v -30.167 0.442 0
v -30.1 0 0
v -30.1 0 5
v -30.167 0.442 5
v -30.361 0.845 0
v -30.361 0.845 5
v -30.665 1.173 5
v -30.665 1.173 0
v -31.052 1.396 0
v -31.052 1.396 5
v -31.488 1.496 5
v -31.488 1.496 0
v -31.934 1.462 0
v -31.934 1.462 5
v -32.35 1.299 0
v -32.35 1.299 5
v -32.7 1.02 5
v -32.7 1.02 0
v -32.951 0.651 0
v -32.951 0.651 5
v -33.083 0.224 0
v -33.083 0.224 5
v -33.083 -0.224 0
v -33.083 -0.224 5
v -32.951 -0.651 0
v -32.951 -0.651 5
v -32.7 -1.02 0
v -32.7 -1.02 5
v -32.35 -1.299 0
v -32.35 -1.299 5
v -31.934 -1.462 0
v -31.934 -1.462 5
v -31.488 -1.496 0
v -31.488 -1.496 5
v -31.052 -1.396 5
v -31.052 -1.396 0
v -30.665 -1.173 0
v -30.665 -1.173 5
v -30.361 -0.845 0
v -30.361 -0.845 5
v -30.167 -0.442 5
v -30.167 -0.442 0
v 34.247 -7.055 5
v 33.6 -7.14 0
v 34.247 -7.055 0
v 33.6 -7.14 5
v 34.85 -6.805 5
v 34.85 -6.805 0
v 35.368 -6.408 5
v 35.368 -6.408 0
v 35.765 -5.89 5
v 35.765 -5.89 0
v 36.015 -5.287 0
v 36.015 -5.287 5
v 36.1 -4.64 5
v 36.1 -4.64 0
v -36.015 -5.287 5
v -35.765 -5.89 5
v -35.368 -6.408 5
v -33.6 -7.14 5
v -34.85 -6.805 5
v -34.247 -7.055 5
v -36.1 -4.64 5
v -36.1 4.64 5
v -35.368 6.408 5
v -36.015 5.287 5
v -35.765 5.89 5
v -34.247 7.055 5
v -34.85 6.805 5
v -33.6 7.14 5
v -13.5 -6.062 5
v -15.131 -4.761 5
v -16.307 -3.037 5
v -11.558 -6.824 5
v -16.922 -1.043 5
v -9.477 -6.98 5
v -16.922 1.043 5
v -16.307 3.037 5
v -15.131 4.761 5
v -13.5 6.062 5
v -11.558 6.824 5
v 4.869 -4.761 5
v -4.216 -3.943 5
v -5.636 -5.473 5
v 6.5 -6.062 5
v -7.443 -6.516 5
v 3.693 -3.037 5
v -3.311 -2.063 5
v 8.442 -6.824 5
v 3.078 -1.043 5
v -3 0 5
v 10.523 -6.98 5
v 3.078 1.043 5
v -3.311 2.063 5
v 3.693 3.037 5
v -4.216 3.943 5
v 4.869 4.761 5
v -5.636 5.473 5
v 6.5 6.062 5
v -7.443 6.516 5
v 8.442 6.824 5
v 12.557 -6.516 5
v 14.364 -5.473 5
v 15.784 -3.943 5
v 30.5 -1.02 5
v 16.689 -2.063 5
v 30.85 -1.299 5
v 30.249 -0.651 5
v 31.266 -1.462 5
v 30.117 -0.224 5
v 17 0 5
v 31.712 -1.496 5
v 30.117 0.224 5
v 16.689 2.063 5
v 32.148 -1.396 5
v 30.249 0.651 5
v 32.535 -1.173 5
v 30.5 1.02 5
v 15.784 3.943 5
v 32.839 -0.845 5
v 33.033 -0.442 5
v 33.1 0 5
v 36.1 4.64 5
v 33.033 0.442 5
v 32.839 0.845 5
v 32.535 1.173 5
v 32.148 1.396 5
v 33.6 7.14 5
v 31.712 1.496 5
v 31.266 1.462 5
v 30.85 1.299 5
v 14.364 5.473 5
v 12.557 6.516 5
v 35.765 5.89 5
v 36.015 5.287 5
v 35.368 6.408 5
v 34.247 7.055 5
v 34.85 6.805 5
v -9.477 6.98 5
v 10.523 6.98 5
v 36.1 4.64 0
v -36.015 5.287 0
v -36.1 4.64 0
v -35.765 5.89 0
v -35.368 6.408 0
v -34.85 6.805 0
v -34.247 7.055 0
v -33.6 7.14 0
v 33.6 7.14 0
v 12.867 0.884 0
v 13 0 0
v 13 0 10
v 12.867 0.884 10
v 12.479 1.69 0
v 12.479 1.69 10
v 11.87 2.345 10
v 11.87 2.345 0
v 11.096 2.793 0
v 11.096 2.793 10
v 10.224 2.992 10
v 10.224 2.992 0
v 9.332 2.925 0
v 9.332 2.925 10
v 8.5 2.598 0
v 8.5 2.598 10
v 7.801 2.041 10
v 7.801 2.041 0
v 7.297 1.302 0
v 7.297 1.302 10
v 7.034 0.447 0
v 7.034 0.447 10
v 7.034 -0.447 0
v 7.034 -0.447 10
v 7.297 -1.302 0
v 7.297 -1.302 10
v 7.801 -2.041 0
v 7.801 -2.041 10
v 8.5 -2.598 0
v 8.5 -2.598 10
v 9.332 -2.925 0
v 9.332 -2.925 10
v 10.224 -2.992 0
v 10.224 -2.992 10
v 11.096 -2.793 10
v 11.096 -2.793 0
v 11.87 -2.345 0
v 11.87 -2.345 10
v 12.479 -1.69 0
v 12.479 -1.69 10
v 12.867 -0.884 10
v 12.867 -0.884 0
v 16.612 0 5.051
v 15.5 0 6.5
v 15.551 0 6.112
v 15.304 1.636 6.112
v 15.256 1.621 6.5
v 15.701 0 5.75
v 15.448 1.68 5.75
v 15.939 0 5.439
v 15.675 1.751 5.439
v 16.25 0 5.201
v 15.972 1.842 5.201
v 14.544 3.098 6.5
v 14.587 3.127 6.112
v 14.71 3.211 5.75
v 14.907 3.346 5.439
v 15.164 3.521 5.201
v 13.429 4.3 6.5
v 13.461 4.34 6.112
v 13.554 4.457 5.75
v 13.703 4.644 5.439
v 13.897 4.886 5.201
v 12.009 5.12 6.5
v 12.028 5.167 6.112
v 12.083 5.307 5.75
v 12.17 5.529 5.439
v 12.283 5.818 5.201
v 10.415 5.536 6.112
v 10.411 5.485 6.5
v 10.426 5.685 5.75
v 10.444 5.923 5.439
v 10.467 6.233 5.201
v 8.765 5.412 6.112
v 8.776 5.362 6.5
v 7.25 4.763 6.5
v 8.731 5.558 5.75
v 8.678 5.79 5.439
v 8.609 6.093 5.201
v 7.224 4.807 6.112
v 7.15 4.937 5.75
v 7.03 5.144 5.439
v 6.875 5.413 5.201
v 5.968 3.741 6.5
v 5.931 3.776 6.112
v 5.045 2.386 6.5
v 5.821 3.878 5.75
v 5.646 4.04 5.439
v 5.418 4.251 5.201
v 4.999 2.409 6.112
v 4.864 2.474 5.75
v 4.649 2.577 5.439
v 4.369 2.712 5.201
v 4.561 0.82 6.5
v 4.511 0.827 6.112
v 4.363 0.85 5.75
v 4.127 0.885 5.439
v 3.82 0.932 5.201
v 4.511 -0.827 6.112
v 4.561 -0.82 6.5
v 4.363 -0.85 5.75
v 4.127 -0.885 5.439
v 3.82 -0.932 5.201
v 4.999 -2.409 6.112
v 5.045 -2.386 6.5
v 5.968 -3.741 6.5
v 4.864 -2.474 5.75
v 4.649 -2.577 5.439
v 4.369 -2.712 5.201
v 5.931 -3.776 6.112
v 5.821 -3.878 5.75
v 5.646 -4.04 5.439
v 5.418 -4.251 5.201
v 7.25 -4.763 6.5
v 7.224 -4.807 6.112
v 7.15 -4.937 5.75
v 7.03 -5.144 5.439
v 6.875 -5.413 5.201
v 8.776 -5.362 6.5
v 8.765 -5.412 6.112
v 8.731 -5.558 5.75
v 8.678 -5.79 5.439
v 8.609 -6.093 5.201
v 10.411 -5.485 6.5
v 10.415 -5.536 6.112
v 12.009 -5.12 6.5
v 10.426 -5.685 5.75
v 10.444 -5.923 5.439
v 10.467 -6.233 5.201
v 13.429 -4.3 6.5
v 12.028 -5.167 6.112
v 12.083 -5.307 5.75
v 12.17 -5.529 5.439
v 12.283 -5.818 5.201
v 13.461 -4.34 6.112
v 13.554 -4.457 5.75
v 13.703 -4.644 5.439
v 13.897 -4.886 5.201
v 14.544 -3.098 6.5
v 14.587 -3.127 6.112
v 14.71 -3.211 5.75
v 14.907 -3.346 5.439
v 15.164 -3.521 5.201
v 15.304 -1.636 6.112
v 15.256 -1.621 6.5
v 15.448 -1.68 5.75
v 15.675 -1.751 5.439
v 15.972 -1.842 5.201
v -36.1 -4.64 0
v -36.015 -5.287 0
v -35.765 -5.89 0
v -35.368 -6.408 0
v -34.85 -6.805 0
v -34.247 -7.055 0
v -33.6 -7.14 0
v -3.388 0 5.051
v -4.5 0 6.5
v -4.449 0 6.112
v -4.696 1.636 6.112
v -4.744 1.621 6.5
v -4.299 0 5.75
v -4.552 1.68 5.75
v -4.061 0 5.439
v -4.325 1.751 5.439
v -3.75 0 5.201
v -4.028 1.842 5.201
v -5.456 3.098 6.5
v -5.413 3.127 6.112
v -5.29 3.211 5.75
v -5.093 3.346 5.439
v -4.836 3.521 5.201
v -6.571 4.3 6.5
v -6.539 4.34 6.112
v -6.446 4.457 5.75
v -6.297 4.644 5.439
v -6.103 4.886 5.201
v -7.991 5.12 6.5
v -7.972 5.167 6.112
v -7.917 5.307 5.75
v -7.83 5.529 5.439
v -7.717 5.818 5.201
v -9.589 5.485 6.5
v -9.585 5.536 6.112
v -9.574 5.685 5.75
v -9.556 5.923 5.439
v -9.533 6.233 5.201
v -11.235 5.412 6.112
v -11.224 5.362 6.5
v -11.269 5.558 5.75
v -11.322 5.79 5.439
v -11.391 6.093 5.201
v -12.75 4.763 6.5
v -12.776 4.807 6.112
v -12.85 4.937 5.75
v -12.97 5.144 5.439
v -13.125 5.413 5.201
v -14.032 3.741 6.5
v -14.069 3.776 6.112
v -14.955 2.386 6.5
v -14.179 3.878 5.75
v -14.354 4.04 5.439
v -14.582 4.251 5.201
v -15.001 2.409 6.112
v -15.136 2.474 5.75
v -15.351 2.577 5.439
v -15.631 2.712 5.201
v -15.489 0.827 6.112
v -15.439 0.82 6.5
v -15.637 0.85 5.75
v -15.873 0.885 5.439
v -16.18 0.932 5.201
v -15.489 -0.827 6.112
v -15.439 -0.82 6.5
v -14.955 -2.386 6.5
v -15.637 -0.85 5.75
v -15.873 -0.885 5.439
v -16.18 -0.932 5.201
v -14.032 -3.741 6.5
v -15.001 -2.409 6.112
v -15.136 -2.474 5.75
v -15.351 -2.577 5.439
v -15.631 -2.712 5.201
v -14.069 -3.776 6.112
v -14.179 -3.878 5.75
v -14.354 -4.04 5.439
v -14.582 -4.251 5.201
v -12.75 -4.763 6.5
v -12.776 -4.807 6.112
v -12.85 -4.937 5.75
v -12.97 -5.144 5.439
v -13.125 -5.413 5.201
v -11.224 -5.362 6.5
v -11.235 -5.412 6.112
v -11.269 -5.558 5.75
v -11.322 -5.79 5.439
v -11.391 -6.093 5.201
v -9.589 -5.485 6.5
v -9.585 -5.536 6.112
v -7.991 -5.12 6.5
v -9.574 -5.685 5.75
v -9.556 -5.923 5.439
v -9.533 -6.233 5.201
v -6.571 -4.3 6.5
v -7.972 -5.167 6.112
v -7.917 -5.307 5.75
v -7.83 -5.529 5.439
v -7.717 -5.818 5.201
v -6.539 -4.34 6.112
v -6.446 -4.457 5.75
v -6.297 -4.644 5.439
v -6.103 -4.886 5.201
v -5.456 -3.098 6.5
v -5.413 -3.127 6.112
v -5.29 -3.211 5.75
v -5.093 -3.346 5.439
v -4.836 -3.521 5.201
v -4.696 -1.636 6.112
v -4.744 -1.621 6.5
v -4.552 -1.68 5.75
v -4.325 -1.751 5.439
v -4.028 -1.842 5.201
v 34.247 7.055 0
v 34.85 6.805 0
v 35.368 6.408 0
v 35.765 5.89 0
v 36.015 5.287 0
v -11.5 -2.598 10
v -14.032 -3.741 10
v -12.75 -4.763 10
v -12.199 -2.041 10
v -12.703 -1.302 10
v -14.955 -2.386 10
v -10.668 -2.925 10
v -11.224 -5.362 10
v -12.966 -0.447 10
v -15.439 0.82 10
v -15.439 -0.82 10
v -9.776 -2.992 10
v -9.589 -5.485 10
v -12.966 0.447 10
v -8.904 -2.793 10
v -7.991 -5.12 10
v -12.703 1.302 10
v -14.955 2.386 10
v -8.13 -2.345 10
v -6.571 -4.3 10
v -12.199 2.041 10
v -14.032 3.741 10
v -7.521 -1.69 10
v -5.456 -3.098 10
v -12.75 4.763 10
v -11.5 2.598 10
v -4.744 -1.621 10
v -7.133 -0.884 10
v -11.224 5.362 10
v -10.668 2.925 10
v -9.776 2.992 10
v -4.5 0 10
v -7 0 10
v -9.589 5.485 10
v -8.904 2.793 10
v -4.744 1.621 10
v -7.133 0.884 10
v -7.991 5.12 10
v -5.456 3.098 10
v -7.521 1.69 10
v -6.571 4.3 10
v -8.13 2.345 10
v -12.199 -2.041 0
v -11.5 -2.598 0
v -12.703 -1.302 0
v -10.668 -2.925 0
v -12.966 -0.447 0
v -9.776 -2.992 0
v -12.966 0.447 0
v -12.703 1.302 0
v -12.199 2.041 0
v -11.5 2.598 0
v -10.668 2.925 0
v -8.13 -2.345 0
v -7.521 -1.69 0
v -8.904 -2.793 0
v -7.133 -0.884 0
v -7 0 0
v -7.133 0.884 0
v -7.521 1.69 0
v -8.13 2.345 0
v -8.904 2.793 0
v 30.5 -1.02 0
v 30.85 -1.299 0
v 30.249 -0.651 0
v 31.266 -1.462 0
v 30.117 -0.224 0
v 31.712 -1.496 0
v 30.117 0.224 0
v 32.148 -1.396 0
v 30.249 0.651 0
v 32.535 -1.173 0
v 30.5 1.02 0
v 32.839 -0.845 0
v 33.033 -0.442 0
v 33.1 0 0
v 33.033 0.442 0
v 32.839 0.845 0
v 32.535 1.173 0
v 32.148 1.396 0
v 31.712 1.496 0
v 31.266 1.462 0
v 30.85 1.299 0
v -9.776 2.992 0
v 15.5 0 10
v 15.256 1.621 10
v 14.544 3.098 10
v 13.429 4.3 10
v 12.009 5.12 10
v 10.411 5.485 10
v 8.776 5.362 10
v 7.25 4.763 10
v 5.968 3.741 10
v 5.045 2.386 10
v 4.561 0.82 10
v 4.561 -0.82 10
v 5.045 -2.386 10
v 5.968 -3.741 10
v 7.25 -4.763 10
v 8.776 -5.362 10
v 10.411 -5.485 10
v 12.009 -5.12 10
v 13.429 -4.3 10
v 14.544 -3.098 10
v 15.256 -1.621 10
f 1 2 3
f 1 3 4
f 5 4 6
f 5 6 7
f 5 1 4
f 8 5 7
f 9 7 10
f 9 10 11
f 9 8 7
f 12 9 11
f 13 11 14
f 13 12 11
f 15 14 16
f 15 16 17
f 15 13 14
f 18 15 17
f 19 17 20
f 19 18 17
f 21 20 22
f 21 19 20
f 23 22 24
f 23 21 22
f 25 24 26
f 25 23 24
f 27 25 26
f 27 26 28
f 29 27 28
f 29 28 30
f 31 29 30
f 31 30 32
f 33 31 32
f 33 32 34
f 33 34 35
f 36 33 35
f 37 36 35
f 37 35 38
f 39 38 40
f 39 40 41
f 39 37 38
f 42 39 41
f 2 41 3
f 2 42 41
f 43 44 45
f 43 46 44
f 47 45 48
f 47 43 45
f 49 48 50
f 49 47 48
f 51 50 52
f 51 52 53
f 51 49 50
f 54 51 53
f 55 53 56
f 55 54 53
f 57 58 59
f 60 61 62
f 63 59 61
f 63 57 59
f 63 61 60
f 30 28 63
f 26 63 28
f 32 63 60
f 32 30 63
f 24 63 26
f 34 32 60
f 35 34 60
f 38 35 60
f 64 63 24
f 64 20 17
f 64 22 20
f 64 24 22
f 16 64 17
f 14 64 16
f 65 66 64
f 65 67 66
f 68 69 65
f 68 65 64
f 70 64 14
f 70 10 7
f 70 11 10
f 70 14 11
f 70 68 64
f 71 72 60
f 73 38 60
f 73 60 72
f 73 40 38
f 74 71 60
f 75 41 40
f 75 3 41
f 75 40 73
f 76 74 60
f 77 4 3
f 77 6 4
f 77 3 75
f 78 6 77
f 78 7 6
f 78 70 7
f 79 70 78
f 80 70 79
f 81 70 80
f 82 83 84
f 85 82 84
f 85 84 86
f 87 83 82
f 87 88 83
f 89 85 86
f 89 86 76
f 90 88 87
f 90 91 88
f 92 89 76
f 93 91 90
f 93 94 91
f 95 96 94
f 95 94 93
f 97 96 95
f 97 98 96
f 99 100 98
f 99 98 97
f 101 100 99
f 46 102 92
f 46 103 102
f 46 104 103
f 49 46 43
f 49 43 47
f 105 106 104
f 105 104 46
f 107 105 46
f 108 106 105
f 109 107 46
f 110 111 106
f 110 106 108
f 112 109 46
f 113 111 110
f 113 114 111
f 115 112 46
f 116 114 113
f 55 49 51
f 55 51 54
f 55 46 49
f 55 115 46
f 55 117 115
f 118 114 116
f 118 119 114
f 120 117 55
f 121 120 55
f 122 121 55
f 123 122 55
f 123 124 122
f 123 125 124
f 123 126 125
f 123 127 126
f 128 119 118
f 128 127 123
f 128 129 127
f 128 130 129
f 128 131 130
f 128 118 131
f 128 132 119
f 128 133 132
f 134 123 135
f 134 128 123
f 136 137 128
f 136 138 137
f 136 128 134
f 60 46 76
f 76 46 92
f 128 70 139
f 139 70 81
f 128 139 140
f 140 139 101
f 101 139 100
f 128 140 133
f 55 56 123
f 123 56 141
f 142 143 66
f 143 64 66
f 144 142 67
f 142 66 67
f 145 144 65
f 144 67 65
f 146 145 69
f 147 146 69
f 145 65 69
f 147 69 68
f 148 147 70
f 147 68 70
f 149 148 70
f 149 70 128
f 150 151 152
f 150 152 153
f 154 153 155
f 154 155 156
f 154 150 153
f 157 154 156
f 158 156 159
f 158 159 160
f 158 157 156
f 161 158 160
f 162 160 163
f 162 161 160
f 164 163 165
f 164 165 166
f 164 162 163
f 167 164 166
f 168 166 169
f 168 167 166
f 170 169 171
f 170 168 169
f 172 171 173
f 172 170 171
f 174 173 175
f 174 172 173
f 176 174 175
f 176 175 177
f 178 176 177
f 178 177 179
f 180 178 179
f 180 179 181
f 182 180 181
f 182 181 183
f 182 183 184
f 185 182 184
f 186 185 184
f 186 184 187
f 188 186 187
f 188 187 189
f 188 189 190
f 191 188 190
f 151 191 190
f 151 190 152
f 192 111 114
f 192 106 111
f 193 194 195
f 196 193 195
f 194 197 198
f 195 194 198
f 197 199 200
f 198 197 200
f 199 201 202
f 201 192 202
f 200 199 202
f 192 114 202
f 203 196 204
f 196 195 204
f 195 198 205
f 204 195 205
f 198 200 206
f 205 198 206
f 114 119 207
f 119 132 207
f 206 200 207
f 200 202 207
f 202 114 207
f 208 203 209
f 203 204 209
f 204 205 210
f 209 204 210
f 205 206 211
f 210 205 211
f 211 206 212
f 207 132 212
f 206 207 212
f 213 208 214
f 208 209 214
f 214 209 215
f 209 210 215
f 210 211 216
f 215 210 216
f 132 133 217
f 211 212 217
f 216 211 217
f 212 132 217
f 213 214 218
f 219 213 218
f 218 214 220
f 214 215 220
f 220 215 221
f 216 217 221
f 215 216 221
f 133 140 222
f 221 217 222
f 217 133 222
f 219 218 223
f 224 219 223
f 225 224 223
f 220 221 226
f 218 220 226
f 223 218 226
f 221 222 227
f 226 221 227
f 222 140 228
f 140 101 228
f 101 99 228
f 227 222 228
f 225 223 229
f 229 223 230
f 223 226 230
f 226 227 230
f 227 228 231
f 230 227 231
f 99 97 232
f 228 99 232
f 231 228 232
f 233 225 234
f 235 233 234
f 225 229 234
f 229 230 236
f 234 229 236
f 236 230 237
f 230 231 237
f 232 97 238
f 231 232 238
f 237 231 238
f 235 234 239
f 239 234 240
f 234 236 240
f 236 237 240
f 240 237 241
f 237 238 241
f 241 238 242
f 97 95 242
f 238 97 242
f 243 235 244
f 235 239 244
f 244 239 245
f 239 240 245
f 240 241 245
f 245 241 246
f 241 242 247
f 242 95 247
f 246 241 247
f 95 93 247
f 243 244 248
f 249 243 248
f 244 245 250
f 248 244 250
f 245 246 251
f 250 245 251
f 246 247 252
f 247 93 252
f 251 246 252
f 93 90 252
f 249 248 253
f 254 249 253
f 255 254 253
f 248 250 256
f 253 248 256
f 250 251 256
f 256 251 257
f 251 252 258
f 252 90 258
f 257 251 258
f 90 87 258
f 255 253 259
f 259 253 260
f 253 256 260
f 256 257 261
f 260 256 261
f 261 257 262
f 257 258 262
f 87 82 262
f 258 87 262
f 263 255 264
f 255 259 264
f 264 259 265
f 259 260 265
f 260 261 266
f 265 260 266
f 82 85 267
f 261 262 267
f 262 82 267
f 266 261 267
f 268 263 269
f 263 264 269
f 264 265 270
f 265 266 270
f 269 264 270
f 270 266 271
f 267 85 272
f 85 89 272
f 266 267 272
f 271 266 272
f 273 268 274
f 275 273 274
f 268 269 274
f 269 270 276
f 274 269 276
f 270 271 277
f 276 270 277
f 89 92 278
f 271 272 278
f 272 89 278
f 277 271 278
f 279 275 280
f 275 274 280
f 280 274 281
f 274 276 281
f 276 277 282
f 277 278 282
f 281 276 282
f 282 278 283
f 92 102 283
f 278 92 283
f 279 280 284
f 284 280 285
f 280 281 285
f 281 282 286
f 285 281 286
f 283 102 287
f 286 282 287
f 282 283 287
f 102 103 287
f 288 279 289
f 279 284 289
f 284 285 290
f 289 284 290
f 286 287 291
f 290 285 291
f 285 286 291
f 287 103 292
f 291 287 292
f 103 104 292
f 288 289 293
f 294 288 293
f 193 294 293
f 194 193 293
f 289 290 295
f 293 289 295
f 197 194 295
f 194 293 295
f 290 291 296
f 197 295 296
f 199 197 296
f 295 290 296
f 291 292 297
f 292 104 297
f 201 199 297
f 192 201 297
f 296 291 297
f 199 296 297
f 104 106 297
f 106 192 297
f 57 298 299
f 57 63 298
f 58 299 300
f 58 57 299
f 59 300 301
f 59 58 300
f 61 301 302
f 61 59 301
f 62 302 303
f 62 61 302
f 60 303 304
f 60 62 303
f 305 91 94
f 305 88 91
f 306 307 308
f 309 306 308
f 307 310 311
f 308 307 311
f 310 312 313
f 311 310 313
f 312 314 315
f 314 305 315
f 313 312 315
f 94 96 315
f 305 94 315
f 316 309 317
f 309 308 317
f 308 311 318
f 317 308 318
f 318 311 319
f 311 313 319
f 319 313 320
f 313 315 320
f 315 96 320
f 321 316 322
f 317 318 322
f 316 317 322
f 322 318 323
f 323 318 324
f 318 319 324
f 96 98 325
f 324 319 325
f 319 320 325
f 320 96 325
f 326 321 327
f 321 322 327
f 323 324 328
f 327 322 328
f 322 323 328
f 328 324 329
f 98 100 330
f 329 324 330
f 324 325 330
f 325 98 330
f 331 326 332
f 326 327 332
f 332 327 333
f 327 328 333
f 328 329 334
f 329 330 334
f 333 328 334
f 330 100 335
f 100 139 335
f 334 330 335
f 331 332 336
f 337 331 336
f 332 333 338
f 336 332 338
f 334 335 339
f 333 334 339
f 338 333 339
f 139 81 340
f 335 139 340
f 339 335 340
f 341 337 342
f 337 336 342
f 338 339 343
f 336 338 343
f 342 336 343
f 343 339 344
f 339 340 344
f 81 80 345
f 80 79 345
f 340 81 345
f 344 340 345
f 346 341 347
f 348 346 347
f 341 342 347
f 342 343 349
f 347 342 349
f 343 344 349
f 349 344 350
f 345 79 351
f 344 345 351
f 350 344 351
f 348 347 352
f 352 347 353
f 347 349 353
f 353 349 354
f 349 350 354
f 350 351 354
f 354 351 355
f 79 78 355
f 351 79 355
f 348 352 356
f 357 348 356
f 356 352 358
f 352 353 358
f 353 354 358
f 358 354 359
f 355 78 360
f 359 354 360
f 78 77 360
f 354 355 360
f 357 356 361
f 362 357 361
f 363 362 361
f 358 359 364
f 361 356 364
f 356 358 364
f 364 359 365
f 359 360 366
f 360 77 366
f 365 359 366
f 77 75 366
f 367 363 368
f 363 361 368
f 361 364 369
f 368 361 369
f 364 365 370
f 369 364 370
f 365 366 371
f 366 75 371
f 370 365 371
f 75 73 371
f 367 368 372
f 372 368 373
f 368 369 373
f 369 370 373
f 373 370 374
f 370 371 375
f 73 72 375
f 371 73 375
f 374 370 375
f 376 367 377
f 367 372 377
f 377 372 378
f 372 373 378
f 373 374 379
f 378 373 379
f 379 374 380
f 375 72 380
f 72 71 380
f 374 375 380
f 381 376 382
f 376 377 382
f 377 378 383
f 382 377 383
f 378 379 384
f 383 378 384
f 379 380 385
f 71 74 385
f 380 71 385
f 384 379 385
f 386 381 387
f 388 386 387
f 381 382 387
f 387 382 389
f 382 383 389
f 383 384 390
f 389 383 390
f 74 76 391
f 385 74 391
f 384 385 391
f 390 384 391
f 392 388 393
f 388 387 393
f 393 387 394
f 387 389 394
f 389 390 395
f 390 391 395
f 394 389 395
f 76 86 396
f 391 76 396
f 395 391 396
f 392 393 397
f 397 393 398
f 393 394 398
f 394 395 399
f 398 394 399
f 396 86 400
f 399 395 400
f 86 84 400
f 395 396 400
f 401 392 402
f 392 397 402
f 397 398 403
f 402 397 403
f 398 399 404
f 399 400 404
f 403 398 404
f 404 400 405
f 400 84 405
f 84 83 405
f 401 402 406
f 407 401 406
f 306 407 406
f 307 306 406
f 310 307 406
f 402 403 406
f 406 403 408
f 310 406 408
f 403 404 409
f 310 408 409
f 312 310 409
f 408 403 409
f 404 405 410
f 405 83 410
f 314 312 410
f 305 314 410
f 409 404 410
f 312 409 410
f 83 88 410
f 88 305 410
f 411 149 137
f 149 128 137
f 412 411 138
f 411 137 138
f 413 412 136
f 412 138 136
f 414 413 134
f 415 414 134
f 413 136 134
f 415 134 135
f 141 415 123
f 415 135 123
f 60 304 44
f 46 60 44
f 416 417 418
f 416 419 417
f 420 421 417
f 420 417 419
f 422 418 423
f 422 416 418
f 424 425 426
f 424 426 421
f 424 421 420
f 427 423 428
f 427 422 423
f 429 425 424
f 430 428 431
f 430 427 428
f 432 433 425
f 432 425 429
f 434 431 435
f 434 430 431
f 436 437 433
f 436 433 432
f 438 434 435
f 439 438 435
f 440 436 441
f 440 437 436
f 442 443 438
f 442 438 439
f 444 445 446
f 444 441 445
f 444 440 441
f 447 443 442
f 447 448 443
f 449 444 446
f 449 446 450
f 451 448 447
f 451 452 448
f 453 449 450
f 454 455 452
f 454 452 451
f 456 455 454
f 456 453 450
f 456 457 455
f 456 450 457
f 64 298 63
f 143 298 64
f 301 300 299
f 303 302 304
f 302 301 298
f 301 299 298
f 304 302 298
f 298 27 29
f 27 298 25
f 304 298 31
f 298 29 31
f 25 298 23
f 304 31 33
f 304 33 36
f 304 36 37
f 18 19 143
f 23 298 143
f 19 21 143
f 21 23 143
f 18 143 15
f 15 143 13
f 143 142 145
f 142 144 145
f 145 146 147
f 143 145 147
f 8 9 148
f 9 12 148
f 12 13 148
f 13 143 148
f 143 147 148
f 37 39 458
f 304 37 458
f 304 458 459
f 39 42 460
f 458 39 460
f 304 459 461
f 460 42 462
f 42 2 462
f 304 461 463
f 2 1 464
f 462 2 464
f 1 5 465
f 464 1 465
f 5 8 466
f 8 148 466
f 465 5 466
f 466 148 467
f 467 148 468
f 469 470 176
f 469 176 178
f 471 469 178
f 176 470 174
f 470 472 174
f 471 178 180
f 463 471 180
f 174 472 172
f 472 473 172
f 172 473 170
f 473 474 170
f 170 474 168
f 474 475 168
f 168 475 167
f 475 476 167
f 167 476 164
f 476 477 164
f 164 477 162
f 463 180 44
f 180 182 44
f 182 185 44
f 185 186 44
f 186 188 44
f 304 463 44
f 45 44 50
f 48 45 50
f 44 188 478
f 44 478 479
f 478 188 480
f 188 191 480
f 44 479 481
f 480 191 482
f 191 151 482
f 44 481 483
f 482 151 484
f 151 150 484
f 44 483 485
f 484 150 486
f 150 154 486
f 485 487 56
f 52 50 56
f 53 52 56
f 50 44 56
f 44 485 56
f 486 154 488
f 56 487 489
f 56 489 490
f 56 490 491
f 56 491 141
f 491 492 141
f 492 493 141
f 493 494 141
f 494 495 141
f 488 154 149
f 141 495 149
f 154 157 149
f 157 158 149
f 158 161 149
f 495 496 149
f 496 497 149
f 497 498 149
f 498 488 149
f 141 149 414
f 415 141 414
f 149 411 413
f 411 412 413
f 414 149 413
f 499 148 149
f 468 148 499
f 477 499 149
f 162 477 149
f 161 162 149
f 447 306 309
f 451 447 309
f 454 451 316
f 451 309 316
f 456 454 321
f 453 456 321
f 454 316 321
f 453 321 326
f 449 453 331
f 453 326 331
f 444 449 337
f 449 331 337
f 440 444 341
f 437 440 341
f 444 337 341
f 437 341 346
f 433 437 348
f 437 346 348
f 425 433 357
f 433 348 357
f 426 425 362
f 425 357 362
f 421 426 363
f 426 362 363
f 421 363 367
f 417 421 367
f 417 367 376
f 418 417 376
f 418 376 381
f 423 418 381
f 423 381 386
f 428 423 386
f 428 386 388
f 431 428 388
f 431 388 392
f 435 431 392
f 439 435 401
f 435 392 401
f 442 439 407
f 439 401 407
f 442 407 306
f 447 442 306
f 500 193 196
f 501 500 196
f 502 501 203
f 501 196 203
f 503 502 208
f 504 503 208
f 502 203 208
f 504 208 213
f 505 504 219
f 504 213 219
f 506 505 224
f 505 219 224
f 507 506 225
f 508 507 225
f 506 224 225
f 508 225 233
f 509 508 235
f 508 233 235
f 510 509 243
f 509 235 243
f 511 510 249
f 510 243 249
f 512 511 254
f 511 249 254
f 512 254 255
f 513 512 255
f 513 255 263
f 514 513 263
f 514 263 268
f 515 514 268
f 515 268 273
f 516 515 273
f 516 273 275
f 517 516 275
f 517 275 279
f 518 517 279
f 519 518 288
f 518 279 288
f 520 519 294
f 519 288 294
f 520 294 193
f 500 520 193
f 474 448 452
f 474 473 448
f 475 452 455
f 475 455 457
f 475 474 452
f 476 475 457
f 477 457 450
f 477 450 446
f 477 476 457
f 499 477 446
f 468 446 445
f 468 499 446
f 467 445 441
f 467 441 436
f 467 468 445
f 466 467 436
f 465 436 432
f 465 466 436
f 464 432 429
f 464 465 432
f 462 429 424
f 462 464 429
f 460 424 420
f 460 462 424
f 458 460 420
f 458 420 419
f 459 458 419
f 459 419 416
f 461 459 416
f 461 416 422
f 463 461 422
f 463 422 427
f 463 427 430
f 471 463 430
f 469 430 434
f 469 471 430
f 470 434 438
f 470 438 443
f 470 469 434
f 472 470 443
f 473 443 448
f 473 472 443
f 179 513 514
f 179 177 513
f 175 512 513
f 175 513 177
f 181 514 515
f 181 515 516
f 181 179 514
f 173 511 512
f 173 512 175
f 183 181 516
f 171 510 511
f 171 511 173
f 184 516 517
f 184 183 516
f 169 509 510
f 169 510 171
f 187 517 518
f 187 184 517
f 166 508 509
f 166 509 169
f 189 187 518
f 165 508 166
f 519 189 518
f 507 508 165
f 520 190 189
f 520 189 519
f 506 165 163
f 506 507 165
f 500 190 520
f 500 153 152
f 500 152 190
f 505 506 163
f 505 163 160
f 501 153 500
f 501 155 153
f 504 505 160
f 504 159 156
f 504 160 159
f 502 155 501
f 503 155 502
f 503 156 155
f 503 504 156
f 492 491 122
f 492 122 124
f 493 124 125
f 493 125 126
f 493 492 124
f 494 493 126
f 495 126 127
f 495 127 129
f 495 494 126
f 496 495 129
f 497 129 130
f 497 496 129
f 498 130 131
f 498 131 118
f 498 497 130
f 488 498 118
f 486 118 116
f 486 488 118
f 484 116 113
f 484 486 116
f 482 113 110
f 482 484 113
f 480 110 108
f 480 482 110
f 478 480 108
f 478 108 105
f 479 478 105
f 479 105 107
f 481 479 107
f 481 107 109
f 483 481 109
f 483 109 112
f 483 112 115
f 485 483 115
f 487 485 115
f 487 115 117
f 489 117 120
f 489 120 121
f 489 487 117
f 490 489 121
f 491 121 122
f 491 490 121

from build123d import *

# Parameters (mm, degrees)
SKETCH_1_W      = 72.2
SKETCH_1_H      = 14.28
SKETCH_1_R      = 1.5
SKETCH_1_R_2    = 3
EXTRUDE_1_DEPTH = 5
FILLET_1_R      = 2.5
SKETCH_2_R      = 5.5
SKETCH_2_R_2    = 3
EXTRUDE_2_DEPTH = 5
FILLET_2_R      = 1.5


with BuildPart() as part:
    # 草图1 → 凸台-拉伸1 (new body)
    with BuildSketch(Plane.XY):
        Rectangle(SKETCH_1_W, SKETCH_1_H)
        with Locations((31.6, 0)):
            Circle(SKETCH_1_R, mode=Mode.SUBTRACT)
        with Locations((-31.6, 0)):
            Circle(SKETCH_1_R, mode=Mode.SUBTRACT)
        with Locations((10, 0)):
            Circle(SKETCH_1_R_2, mode=Mode.SUBTRACT)
        with Locations((-10, 0)):
            Circle(SKETCH_1_R_2, mode=Mode.SUBTRACT)
    extrude(amount=EXTRUDE_1_DEPTH)

    # 圆角1
    fillet_1_edges = [part.edges().sort_by_distance(p)[0] for p in [
        (-36.1, 7.14, 2.5),
        (36.1, 7.14, 2.5),
        (36.1, -7.14, 2.5),
        (-36.1, -7.14, 2.5),
    ]]
    fillet(fillet_1_edges, radius=FILLET_1_R)

    # 草图2 → 凸台-拉伸2 (add)
    # profile 1 of 2: a face of its own
    with BuildSketch(Plane.XY.offset(5)):
        with Locations((-10, 0)):
            Circle(SKETCH_2_R)
        with Locations((-10, 0)):
            Circle(SKETCH_2_R_2, mode=Mode.SUBTRACT)
    # profile 2 of 2: a face of its own
    with BuildSketch(Plane.XY.offset(5)):
        with Locations((10, 0)):
            Circle(SKETCH_2_R)
        with Locations((10, 0)):
            Circle(SKETCH_2_R_2, mode=Mode.SUBTRACT)
    extrude(amount=EXTRUDE_2_DEPTH)

    # 圆角2
    fillet_2_edges = [part.edges().sort_by_distance(p)[0] for p in [
        (-15.5, 0, 5),
        (4.5, 0, 5),
    ]]
    fillet(fillet_2_edges, radius=FILLET_2_R)


solid = part.part
